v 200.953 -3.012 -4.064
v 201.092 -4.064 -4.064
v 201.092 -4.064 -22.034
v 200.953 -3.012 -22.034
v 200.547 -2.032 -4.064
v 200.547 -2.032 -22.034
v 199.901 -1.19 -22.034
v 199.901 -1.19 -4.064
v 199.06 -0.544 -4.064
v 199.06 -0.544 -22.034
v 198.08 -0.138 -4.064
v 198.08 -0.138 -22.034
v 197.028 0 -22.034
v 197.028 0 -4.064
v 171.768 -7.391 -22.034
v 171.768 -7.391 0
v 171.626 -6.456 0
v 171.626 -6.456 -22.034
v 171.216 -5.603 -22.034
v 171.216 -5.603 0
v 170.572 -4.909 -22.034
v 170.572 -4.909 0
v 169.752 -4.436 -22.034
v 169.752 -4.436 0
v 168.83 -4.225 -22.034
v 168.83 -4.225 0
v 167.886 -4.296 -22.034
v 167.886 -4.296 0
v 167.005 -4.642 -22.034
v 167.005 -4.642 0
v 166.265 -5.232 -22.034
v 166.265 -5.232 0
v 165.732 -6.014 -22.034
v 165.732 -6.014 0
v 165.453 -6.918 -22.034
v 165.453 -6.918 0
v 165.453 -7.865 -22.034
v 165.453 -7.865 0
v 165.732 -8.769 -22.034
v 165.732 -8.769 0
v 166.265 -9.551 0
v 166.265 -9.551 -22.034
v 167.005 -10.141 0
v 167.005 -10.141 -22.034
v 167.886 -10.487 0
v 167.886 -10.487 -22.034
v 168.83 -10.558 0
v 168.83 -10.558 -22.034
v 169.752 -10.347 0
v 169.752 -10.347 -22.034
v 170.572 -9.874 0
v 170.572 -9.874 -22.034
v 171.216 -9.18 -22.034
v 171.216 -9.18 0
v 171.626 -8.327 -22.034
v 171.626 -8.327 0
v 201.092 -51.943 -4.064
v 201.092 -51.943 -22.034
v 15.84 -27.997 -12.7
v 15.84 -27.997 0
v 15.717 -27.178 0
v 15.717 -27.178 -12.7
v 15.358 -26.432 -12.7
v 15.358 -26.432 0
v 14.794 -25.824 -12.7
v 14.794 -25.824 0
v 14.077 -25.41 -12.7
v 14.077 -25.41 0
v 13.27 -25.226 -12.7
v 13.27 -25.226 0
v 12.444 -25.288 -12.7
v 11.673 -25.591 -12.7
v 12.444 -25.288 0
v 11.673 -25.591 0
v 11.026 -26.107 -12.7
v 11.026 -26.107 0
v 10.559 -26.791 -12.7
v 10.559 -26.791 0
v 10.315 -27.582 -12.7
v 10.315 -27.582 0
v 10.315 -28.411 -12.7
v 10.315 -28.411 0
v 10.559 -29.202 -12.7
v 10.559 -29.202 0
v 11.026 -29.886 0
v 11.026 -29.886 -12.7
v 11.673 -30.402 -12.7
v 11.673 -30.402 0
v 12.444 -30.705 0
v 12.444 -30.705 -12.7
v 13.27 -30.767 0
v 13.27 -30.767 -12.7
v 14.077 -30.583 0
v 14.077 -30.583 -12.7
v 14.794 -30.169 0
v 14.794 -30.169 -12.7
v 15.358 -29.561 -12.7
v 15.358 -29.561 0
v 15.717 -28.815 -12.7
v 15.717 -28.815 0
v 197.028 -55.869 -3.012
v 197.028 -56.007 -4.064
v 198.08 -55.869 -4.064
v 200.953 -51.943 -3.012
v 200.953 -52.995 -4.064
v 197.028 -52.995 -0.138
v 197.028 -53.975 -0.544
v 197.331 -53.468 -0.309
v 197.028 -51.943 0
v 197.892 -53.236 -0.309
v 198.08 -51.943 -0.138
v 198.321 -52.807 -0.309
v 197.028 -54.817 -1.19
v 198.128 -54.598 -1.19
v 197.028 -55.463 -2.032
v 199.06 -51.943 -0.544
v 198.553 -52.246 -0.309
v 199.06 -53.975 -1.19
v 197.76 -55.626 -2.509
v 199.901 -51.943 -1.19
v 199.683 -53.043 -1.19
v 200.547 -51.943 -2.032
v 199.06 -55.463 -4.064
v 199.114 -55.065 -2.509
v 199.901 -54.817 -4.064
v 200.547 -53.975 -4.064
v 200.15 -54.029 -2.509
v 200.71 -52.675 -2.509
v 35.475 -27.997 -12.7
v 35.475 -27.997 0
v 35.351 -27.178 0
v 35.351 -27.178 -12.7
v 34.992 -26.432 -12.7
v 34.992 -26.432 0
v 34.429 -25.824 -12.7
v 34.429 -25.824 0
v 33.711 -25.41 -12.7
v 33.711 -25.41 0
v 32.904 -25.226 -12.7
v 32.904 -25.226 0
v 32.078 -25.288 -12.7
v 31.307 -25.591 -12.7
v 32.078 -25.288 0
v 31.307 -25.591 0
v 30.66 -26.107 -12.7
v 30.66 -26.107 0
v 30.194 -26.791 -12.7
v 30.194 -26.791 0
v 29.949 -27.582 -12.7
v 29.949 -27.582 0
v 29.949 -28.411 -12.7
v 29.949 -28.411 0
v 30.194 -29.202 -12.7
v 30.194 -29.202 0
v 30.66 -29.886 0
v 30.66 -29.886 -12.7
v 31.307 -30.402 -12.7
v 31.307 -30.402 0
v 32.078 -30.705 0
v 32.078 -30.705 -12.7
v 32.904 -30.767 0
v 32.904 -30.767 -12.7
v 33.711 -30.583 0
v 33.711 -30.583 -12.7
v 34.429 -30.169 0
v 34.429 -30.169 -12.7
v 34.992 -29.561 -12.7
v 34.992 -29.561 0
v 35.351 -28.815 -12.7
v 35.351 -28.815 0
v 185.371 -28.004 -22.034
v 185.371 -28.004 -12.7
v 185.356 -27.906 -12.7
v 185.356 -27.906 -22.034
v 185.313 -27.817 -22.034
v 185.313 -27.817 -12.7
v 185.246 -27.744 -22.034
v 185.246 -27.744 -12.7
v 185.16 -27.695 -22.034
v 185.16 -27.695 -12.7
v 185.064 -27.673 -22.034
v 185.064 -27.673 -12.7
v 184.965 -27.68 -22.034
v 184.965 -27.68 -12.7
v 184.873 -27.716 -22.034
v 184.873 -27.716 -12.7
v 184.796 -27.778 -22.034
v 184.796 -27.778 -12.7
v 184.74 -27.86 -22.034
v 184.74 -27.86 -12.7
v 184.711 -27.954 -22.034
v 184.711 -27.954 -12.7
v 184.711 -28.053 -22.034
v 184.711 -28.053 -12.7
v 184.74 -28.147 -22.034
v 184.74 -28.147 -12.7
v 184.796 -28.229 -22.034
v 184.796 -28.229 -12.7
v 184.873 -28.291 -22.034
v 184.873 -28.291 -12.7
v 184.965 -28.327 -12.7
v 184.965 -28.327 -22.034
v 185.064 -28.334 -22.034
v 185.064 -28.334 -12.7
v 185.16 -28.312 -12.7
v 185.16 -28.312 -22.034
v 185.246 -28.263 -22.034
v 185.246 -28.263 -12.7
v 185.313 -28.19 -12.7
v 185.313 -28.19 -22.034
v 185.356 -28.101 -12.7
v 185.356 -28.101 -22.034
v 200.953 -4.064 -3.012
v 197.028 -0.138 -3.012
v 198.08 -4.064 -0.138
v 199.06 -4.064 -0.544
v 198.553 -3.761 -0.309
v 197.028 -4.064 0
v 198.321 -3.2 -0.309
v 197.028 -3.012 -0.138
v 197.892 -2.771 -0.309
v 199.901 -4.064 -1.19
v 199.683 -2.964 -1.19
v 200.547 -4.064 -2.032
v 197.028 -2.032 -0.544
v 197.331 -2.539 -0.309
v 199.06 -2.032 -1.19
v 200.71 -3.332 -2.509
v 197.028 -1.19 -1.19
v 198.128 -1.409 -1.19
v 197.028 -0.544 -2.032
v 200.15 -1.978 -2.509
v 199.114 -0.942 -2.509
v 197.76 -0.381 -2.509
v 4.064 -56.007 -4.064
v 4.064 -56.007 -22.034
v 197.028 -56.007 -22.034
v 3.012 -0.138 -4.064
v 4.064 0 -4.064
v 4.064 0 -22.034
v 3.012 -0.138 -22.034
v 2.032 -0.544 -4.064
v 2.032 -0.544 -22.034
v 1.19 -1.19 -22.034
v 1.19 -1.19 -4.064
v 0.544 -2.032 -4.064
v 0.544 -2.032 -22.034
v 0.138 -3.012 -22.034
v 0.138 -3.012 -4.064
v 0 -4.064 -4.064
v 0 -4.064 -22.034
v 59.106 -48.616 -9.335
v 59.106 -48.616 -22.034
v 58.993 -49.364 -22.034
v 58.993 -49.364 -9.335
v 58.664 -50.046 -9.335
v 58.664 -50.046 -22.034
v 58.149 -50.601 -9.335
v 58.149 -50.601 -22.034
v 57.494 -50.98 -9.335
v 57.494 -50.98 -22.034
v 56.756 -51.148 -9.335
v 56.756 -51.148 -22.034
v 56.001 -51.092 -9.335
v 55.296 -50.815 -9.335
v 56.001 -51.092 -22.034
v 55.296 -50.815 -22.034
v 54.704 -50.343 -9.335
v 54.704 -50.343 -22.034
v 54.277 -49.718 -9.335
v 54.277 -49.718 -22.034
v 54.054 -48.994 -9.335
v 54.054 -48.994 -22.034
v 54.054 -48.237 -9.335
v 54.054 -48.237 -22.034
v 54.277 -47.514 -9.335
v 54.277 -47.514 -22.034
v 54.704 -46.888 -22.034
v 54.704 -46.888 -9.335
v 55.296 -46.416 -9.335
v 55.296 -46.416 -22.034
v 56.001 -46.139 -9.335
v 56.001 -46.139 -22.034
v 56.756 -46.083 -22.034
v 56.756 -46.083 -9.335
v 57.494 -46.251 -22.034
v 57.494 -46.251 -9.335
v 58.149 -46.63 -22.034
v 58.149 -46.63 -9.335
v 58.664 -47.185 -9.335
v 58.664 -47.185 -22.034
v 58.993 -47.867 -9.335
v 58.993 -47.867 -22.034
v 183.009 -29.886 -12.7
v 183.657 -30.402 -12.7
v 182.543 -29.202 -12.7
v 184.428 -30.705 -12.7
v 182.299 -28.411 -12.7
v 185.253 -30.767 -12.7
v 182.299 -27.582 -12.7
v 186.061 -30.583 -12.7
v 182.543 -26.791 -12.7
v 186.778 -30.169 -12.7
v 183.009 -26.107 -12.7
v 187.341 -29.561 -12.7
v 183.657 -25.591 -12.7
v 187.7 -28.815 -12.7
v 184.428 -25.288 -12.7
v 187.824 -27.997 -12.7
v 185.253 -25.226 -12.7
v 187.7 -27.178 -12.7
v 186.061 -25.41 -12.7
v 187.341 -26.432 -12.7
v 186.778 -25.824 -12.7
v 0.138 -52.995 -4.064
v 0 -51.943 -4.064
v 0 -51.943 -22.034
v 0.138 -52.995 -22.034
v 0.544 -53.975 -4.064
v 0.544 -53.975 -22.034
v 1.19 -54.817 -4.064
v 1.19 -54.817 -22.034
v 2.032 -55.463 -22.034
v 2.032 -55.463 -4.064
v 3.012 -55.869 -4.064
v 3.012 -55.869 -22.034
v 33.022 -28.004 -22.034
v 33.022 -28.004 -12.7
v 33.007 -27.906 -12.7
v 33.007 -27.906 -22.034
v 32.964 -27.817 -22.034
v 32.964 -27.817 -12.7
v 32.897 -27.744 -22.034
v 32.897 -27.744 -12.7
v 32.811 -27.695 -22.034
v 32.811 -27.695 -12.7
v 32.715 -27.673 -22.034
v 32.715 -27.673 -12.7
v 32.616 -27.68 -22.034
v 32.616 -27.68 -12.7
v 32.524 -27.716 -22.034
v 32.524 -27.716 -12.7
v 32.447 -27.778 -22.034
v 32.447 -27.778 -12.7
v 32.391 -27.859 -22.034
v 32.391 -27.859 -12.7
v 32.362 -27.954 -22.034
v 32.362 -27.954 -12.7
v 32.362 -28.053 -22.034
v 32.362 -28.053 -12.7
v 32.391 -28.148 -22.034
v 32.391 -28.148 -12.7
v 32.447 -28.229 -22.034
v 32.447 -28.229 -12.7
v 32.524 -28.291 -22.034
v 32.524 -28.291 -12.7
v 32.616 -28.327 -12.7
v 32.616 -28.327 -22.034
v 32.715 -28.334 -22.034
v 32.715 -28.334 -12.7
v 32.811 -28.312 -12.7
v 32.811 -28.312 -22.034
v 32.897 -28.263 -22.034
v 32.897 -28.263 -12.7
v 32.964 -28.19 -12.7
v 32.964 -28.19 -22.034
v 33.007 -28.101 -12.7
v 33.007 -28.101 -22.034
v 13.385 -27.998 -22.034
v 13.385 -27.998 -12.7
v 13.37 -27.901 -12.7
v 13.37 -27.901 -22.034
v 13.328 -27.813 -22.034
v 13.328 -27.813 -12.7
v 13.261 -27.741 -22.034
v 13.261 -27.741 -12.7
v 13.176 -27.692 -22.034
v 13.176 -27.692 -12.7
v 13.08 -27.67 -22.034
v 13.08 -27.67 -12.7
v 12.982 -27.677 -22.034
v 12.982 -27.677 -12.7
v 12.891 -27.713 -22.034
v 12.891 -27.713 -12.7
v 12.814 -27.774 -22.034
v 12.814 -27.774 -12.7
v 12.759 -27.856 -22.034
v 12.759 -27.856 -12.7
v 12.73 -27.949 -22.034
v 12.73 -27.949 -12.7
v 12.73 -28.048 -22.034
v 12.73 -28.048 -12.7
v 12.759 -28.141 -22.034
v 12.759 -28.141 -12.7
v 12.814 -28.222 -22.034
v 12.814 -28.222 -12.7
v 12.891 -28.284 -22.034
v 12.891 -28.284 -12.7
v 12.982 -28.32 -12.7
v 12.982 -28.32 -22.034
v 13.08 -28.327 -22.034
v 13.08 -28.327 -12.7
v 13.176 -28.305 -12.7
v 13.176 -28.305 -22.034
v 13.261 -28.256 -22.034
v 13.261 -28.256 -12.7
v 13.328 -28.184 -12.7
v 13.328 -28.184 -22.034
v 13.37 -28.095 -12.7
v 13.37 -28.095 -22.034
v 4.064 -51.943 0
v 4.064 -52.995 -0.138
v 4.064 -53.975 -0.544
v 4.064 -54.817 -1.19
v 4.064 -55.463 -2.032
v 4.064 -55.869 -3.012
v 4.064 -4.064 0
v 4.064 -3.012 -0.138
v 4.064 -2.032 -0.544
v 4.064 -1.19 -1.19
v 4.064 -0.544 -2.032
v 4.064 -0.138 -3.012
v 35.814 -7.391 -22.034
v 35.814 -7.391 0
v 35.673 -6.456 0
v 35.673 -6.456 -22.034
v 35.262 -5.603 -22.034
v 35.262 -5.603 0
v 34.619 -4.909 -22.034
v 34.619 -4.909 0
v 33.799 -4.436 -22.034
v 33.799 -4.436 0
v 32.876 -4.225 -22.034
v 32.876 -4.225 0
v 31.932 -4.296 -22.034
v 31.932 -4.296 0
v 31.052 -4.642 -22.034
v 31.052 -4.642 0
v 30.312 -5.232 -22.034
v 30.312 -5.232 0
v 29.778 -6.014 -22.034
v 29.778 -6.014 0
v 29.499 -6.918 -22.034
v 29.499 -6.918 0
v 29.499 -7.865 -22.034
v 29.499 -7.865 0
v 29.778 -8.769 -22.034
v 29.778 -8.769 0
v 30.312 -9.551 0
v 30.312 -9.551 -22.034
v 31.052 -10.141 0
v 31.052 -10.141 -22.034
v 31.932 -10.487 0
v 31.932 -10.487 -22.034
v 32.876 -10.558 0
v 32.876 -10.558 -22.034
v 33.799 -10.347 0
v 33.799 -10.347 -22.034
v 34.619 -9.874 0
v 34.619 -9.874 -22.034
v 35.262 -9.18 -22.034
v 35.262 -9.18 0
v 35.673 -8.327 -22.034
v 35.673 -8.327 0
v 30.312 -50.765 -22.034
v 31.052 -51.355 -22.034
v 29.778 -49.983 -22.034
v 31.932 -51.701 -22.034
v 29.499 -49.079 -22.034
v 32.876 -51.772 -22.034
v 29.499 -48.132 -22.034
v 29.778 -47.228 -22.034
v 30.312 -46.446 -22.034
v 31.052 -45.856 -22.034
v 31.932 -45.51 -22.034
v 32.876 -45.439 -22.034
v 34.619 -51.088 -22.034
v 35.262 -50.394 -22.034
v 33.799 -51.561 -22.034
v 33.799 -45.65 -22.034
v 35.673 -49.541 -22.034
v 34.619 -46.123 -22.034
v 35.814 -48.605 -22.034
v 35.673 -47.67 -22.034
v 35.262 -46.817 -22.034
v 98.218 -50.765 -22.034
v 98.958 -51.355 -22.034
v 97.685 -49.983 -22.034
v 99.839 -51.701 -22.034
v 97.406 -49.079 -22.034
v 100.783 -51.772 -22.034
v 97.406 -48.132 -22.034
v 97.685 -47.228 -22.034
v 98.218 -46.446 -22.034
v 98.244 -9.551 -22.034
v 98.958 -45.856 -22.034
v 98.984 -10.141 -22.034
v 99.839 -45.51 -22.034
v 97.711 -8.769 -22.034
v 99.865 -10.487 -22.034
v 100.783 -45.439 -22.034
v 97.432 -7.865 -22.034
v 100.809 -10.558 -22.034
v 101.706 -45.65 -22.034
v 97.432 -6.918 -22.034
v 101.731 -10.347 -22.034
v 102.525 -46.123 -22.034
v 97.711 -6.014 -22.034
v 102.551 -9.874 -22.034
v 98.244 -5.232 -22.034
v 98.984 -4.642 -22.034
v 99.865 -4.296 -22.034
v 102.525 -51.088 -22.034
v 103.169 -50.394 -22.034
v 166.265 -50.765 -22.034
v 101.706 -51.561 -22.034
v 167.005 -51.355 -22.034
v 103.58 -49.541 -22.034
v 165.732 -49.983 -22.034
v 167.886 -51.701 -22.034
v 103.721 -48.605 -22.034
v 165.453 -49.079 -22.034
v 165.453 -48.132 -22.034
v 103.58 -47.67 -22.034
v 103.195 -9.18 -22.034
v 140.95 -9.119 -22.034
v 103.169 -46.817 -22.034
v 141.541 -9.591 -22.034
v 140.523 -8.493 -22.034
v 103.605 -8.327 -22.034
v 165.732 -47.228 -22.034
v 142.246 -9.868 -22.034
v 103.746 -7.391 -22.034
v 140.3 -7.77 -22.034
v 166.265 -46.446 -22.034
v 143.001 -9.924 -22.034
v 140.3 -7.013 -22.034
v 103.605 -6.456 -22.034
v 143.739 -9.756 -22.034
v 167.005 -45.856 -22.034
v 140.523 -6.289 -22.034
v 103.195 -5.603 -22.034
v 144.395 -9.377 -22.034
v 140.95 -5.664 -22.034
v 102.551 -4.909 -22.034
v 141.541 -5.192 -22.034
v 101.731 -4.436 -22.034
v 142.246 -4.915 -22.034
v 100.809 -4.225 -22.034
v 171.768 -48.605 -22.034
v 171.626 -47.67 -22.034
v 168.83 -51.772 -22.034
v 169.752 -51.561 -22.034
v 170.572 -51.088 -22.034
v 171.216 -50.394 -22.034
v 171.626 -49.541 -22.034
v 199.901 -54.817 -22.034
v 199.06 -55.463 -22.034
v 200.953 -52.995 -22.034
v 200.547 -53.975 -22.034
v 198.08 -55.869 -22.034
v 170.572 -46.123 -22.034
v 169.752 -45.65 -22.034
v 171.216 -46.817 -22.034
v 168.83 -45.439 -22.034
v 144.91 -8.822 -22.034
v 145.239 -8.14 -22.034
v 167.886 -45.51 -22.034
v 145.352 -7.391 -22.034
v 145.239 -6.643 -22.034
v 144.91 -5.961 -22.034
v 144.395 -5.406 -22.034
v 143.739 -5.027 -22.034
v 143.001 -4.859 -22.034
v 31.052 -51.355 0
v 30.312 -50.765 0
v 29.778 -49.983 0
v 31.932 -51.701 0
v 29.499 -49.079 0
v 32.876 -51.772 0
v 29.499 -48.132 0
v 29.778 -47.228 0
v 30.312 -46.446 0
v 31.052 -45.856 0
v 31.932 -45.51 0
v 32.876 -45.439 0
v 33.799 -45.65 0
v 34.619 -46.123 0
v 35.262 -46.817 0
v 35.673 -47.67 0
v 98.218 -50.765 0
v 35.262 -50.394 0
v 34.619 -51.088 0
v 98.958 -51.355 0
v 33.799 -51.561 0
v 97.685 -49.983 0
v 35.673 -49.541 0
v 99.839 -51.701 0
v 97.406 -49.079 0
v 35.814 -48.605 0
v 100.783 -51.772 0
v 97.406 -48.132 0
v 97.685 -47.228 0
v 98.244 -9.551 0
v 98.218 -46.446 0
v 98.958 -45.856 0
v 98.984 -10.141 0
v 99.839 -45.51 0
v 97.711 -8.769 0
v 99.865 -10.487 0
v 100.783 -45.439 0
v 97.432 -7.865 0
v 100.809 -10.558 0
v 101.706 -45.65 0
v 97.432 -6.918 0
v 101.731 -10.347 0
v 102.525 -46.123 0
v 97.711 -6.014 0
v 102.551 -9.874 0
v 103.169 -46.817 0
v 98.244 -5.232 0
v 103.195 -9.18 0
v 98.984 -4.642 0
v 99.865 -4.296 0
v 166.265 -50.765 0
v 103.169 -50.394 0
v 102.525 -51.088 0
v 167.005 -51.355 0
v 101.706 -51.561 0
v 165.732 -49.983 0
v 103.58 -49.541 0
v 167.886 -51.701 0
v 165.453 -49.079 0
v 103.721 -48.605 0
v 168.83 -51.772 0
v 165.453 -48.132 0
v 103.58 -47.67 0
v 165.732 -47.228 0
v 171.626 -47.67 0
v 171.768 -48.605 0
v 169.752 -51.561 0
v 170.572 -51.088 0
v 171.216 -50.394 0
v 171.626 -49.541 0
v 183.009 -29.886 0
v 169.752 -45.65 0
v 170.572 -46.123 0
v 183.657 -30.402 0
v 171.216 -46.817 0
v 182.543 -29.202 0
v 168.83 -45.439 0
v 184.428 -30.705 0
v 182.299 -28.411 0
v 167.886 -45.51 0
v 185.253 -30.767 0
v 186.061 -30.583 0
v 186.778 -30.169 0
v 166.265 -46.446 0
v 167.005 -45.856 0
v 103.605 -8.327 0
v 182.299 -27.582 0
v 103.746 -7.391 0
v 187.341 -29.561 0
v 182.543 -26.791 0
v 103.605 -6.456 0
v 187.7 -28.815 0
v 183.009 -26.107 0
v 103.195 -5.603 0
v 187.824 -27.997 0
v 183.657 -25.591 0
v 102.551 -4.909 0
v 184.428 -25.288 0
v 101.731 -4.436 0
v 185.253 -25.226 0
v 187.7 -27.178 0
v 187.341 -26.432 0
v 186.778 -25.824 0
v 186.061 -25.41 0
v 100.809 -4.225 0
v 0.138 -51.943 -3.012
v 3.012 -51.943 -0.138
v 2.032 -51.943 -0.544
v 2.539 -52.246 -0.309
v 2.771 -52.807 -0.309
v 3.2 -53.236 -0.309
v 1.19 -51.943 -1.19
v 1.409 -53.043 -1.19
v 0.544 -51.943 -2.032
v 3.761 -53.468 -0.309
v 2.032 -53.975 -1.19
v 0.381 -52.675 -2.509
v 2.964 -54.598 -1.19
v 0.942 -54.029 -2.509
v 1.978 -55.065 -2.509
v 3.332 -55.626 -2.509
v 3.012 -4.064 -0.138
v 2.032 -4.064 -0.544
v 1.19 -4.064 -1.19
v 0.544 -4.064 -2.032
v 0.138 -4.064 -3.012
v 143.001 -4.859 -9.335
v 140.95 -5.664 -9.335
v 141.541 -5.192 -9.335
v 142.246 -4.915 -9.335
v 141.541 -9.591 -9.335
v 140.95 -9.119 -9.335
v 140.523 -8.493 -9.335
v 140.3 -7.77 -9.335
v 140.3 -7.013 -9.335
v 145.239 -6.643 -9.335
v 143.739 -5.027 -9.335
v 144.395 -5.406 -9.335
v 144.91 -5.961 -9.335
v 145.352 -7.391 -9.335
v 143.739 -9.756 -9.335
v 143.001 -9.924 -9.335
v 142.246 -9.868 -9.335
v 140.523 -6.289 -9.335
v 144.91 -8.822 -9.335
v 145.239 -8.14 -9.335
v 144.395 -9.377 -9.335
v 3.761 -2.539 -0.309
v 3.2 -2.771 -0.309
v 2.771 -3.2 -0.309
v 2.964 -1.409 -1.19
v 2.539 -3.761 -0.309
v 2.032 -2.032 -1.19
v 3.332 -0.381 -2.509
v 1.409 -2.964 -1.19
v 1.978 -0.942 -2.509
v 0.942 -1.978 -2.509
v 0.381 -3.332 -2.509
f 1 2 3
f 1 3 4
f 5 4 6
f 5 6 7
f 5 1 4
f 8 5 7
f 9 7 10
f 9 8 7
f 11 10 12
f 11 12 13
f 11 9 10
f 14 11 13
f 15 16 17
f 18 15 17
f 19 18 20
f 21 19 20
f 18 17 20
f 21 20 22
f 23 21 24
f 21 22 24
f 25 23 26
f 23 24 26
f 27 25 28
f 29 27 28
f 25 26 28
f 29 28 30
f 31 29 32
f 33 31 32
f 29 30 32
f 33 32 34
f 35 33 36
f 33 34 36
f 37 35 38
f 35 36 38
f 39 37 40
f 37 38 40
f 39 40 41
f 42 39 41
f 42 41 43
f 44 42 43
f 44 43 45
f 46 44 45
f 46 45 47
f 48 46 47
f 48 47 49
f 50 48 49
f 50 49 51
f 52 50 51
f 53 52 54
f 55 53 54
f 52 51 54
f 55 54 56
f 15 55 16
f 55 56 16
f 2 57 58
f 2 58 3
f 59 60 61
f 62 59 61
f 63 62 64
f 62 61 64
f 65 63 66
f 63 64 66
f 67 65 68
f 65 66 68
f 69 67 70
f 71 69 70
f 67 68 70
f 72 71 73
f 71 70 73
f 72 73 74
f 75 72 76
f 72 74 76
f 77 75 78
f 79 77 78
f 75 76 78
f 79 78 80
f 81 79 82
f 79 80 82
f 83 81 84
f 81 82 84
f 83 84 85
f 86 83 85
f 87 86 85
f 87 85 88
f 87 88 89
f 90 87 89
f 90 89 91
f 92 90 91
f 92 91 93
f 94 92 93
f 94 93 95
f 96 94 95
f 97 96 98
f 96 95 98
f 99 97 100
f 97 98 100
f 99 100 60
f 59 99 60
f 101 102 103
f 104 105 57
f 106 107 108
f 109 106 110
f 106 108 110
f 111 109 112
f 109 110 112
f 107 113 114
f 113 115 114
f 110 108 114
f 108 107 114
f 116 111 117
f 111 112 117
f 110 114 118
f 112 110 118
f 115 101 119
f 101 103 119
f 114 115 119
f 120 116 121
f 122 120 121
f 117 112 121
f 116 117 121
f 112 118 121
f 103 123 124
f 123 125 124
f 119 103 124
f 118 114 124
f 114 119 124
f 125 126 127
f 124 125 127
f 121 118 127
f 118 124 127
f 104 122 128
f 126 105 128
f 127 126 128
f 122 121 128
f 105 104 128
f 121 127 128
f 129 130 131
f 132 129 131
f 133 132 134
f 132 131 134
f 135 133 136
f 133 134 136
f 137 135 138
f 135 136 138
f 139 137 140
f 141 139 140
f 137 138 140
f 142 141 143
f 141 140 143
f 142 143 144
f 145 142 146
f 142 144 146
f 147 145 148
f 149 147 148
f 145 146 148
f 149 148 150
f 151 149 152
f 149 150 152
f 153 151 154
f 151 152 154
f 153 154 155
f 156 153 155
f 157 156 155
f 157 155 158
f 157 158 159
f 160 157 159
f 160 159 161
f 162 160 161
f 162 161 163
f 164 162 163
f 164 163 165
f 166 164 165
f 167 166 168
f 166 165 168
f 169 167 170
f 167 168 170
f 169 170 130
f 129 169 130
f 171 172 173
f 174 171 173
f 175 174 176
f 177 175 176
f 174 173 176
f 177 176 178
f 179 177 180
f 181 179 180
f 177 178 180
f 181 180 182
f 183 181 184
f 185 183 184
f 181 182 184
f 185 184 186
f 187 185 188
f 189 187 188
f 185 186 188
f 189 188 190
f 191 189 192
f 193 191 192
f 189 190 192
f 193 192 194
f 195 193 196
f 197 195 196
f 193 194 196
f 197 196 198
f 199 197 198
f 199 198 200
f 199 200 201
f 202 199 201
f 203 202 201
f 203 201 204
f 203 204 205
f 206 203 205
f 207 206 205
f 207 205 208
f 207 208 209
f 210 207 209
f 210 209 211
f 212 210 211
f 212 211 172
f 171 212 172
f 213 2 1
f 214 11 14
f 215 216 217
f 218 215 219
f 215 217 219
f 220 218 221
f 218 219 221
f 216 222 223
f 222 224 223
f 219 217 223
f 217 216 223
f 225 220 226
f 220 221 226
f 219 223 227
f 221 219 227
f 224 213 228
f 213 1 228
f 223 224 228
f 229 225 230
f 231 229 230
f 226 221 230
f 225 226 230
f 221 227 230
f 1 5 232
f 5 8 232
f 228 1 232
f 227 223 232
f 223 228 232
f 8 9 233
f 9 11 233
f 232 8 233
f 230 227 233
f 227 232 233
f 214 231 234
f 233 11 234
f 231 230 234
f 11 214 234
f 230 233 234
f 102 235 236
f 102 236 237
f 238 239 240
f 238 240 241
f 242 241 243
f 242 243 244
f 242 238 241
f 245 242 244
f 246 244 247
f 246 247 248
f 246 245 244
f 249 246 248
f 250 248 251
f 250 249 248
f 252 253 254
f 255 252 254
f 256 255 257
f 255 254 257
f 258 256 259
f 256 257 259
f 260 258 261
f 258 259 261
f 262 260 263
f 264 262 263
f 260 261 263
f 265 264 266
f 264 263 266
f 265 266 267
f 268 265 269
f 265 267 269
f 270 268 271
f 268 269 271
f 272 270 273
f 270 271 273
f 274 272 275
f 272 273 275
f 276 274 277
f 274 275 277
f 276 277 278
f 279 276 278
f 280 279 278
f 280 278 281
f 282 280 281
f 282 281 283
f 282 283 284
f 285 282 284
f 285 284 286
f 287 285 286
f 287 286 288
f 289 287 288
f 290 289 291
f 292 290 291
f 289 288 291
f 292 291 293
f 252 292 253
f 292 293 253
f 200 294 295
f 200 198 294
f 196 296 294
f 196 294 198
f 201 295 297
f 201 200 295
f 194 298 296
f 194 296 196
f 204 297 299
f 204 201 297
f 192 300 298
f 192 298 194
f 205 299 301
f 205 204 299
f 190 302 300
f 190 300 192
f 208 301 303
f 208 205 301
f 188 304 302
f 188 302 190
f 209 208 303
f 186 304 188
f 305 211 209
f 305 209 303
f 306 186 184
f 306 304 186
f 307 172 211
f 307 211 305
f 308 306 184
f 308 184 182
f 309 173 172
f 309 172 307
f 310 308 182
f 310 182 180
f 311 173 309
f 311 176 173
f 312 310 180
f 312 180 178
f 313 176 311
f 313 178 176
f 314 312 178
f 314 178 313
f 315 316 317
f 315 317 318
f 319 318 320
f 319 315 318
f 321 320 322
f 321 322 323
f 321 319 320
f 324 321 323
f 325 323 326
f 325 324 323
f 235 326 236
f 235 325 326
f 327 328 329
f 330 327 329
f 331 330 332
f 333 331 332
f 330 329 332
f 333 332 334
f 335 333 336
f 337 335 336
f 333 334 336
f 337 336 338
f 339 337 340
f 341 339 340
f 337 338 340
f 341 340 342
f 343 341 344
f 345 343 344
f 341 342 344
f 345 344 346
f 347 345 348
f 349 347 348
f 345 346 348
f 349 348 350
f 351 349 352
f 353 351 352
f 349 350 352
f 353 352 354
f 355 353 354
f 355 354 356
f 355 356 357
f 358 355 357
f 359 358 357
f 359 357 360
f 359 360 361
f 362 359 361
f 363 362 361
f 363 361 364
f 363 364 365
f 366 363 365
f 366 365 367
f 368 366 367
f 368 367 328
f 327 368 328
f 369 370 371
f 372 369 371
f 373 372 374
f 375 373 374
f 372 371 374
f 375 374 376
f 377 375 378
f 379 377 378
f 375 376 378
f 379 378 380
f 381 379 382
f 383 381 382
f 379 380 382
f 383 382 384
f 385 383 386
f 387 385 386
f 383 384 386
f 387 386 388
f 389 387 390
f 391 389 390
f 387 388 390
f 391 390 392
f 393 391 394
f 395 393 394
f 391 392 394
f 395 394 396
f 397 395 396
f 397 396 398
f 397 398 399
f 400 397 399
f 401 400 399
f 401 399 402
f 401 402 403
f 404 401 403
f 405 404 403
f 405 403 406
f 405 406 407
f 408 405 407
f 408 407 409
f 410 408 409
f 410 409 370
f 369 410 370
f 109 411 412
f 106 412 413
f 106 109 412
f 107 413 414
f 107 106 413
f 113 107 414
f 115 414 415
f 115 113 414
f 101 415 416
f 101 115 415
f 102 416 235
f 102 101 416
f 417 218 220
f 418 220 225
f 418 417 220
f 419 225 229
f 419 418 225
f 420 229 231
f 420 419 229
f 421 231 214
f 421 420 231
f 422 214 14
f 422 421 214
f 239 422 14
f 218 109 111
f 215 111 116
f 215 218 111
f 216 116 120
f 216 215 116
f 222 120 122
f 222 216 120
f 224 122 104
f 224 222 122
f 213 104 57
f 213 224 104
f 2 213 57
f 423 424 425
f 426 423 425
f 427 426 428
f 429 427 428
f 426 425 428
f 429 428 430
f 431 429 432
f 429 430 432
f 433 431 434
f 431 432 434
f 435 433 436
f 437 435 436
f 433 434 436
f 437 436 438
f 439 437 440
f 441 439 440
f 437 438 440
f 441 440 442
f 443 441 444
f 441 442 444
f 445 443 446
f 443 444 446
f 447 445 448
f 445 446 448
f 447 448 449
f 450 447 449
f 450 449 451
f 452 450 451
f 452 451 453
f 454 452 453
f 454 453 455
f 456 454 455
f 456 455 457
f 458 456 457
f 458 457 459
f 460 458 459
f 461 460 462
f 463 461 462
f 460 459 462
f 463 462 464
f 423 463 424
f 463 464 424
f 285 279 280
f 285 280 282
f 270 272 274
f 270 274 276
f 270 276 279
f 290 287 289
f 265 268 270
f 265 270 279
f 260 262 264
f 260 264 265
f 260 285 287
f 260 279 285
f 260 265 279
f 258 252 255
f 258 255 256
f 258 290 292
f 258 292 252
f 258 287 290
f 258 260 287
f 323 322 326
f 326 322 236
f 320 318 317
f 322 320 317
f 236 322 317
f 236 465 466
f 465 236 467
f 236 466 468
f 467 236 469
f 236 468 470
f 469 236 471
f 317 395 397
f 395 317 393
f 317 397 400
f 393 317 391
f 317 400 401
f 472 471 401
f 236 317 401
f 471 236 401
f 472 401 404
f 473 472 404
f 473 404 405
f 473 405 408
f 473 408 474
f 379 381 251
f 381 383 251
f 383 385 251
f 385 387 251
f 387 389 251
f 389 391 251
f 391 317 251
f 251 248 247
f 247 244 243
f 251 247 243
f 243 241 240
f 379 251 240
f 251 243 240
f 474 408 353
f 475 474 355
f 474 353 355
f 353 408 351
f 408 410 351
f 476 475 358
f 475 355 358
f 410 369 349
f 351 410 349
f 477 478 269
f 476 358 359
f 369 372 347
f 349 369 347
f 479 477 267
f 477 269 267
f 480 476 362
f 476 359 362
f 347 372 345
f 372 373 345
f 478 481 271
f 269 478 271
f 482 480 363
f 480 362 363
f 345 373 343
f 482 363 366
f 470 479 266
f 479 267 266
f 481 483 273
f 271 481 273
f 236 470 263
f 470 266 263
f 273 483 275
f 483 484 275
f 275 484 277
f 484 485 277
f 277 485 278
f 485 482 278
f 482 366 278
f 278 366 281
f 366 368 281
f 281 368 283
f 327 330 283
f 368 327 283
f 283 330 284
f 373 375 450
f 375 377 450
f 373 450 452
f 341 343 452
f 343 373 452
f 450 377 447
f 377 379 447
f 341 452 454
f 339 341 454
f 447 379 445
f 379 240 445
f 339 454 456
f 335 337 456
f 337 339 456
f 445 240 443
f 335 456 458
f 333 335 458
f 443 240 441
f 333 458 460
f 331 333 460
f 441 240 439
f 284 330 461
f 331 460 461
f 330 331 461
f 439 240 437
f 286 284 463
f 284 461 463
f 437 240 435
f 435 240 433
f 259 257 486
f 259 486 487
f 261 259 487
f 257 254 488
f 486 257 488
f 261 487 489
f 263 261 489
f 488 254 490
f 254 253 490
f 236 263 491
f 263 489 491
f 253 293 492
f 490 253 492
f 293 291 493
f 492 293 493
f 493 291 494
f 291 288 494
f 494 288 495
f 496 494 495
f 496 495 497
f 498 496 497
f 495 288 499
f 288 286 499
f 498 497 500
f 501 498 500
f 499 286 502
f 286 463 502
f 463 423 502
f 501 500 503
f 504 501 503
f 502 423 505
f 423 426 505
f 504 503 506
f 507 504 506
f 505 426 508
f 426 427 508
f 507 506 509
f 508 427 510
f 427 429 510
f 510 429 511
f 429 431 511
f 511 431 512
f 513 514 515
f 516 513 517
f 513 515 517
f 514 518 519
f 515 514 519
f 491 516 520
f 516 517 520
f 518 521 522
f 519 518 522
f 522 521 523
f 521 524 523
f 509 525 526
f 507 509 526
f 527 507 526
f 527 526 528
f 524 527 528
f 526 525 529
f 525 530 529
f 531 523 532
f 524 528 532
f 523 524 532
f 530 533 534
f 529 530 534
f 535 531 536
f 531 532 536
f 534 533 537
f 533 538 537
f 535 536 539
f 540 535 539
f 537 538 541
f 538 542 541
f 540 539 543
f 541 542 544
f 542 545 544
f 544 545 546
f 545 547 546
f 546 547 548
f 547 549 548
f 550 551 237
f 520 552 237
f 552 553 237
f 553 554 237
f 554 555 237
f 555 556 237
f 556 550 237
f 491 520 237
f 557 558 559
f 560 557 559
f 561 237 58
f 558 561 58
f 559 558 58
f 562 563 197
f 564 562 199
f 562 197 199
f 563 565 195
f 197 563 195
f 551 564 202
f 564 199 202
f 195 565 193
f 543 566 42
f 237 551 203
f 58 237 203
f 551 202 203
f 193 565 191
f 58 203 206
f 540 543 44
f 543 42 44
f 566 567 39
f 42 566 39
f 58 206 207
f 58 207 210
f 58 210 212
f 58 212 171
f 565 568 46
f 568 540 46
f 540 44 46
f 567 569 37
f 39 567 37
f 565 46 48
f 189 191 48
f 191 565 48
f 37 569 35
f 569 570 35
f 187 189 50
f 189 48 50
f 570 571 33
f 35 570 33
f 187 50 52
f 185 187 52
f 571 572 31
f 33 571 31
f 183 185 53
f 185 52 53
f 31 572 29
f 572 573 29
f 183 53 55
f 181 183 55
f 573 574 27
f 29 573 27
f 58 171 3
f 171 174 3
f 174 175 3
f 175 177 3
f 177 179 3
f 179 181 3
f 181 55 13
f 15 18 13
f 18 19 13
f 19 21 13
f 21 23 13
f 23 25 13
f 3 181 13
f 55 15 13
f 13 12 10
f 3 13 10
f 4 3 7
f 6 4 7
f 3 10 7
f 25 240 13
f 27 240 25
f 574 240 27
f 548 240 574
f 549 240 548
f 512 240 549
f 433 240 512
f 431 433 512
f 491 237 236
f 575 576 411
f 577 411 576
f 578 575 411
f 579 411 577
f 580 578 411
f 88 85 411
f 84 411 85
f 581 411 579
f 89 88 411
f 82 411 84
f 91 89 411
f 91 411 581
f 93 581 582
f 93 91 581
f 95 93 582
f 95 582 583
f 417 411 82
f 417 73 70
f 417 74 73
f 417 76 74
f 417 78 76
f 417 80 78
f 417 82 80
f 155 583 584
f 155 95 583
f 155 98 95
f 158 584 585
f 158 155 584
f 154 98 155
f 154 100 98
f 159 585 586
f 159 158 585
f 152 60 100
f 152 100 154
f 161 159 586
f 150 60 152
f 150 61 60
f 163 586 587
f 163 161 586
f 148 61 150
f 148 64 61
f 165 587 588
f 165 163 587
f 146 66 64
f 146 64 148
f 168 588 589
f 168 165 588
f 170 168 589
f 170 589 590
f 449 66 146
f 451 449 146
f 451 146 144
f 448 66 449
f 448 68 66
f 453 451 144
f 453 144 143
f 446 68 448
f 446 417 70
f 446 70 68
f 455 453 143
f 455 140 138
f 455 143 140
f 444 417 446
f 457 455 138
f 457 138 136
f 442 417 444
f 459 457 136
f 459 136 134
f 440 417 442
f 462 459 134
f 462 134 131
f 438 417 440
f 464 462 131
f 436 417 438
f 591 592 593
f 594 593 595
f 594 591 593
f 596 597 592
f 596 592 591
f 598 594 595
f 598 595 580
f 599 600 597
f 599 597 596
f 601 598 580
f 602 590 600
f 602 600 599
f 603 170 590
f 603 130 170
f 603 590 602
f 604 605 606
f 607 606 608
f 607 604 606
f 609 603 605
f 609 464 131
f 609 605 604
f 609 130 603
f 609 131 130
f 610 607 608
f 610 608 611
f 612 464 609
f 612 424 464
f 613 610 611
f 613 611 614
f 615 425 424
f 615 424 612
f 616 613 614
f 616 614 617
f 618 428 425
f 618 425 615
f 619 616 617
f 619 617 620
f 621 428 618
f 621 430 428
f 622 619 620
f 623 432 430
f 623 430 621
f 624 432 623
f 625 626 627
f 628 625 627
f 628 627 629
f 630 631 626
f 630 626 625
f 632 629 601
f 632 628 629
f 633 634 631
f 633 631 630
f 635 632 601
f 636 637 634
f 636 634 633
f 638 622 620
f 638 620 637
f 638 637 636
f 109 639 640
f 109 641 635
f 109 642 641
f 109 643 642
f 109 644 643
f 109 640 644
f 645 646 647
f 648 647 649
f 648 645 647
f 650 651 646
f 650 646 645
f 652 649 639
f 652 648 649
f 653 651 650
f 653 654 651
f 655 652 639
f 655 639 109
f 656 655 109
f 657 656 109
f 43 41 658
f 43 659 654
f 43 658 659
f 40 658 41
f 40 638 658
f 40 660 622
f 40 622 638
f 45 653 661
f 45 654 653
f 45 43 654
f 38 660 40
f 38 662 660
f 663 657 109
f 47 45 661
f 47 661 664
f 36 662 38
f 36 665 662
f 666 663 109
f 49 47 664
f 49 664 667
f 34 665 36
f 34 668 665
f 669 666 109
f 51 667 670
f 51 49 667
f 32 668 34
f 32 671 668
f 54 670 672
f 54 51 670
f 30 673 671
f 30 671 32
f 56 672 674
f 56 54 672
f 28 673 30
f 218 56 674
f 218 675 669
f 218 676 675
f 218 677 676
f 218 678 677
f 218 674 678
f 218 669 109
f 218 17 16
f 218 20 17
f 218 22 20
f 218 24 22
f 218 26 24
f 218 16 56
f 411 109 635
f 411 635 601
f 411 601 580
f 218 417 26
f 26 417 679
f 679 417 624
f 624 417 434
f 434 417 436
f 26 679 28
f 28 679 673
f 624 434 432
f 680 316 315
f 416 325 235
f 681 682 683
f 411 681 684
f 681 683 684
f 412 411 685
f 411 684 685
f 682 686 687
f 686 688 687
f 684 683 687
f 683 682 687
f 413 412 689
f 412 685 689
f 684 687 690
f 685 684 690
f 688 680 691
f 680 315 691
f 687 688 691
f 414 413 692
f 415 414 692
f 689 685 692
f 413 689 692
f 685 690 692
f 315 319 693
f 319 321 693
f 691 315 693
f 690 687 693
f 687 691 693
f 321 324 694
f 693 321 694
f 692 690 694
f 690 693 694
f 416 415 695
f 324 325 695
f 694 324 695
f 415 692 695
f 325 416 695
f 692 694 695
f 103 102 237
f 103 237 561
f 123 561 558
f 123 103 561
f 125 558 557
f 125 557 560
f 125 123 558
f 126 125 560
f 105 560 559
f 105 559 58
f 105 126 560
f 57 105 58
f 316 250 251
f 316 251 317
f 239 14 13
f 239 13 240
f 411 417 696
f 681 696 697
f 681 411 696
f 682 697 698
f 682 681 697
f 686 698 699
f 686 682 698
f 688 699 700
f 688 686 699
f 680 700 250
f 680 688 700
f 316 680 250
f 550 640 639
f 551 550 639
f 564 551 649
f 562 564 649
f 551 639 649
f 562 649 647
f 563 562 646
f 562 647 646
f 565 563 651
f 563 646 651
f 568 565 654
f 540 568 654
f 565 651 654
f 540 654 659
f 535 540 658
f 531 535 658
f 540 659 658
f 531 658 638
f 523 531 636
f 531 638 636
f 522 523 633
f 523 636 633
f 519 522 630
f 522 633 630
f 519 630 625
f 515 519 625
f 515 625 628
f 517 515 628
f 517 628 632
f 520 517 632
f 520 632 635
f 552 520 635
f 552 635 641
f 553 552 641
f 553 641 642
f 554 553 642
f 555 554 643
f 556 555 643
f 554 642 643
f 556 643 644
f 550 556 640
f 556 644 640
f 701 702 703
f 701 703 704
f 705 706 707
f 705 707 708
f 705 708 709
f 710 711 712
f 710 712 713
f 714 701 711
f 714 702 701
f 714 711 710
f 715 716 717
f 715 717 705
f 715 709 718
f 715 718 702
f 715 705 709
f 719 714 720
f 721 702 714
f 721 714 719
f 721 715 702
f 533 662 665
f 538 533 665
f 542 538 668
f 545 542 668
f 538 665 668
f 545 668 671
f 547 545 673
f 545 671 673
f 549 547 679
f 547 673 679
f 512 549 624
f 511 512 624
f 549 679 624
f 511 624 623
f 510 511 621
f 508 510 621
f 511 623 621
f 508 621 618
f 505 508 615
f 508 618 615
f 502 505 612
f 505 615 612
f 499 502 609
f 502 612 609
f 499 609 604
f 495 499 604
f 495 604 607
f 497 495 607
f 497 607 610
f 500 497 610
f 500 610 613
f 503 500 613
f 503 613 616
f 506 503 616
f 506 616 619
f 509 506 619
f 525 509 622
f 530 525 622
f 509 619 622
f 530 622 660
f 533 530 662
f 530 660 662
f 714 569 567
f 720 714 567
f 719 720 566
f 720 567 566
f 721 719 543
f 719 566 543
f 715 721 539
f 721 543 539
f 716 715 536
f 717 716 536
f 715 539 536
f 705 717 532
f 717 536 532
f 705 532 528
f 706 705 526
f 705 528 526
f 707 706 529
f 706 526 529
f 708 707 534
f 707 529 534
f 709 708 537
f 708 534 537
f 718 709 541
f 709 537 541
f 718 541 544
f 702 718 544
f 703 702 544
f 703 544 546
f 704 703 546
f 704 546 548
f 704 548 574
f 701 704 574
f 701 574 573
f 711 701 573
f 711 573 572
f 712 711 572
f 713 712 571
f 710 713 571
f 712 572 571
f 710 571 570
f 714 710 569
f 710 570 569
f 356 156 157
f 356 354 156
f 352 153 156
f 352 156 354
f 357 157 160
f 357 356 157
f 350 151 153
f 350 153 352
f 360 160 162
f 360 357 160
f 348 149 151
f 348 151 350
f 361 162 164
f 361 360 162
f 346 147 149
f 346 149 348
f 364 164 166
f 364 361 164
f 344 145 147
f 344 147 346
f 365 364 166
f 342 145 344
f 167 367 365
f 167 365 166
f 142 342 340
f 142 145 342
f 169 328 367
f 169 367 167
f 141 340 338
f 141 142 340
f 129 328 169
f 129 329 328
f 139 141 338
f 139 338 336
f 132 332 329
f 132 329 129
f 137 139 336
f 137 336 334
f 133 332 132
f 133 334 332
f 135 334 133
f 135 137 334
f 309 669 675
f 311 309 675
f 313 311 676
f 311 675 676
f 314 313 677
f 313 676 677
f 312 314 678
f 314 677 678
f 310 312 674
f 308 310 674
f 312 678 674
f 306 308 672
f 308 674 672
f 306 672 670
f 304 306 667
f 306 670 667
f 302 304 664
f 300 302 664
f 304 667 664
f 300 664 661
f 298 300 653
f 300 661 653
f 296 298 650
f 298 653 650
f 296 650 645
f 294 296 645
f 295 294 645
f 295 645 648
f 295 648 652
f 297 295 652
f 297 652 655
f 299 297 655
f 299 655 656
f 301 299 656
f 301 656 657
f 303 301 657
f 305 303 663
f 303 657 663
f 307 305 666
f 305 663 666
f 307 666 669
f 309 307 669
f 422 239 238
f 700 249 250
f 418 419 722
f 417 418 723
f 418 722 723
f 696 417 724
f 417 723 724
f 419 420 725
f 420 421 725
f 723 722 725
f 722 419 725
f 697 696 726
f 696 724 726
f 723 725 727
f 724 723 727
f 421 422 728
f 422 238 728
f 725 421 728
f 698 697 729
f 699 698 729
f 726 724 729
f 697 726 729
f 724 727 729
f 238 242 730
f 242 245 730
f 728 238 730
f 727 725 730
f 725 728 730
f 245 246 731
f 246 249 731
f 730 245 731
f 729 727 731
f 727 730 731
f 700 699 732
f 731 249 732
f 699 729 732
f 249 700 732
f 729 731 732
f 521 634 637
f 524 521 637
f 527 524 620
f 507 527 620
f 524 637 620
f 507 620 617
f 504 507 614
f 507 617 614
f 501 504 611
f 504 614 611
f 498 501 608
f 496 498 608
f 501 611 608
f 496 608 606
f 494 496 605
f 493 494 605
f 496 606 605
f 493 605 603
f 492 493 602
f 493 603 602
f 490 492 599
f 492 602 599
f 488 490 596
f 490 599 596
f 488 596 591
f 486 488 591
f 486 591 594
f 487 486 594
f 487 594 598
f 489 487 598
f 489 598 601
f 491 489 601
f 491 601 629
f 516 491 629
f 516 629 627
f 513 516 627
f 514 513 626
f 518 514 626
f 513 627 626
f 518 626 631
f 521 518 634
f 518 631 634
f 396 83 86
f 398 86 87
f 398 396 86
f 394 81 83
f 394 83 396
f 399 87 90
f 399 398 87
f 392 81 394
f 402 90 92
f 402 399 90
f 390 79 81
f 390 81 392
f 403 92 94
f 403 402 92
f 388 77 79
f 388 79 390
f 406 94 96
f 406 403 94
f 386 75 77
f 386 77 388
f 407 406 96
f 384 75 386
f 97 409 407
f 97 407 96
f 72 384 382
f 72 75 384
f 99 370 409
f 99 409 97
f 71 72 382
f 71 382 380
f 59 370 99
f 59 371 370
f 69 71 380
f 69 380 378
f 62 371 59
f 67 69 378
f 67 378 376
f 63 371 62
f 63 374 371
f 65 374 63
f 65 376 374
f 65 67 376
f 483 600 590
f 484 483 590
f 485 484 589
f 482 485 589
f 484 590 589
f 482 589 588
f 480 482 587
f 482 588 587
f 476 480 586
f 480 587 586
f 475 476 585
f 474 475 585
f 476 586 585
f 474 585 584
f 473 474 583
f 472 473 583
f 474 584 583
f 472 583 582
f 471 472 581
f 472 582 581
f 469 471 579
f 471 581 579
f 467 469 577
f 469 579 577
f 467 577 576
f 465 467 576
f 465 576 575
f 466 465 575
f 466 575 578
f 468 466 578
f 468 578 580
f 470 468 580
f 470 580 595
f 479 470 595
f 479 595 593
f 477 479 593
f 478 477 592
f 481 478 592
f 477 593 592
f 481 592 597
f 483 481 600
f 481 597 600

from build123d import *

# Parameters (mm, degrees)
F0_R     = 3.175
F1_DEPTH = 22.0345
F2_R     = 2.54
F3_DEPTH = 12.7
F4_R     = 0.3318916447
F4_R_2   = 0.3293568933
F4_R_3   = 0.3316016918
F5_DEPTH = 25.4
F6_R     = 2.778125
F7_DEPTH = 12.7
F9_R     = 4.064


with BuildPart() as f1:
    # F0 (on Top) → F1 (new body)
    with BuildSketch(Plane.XY):
        with BuildLine():
            Line((197.0278, 0), (4.064, 0))
            ThreePointArc((4.064, 0), (1.1903180413, -1.1903180413), (0, -4.064))
            Line((0, -4.064), (0, -51.943))
            ThreePointArc((0, -51.943), (1.1903180413, -54.8166819587), (4.064, -56.007))
            Line((4.064, -56.007), (197.0278, -56.007))
            ThreePointArc((197.0278, -56.007), (199.9014819587, -54.8166819587), (201.0918, -51.943))
            Line((201.0918, -51.943), (201.0918, -4.064))
            ThreePointArc((201.0918, -4.064), (199.9014819587, -1.1903180413), (197.0278, 0))
        make_face()
        with Locations((32.639, -48.60544)):
            Circle(F0_R, mode=Mode.SUBTRACT)
        with Locations((100.5459, -48.60544)):
            Circle(F0_R, mode=Mode.SUBTRACT)
        with Locations((168.5925, -48.60544)):
            Circle(F0_R, mode=Mode.SUBTRACT)
        with Locations((32.639, -7.3914)):
            Circle(F0_R, mode=Mode.SUBTRACT)
        with Locations((100.5713, -7.3914)):
            Circle(F0_R, mode=Mode.SUBTRACT)
        with Locations((168.5925, -7.3914)):
            Circle(F0_R, mode=Mode.SUBTRACT)
    extrude(amount=-F1_DEPTH)

    # F2 (on face) → F3 (cut)
    with BuildSketch(Plane(origin=(0, 0, -22.0345), x_dir=(1, 0, 0), z_dir=(0, 0, -1))):
        with Locations((56.5658, 48.6156)):
            Circle(F2_R)
        with Locations((142.8115, 7.3914)):
            Circle(F2_R)
    extrude(amount=-F3_DEPTH, mode=Mode.SUBTRACT)

    # F4 (on face) → F5 (cut)
    with BuildSketch(Plane.XY):
        with Locations((32.6898, -28.0035)):
            Circle(F4_R)
        with Locations((13.0556, -27.99842)):
            Circle(F4_R_2)
        with Locations((185.039, -28.0035)):
            Circle(F4_R_3)
    extrude(amount=-F5_DEPTH, mode=Mode.SUBTRACT)

    # F6 (on Top) → F7 (cut)
    with BuildSketch(Plane.XY):
        with Locations((185.0457321729, -27.9965074454)):
            Circle(F6_R)
        with Locations((32.6965321729, -27.9965074454)):
            Circle(F6_R)
        with Locations((13.0623321729, -27.9965074454)):
            Circle(F6_R)
    extrude(amount=-F7_DEPTH, mode=Mode.SUBTRACT)

    # F9
    f9_edges = [f1.edges().sort_by_distance(p)[0] for p in [
        (100.5459, -56.007, 0),
        (199.901482, -54.816682, 0),
        (201.0918, -28.0035, 0),
        (199.901482, -1.190318, 0),
        (100.5459, 0, 0),
        (1.190318, -1.190318, 0),
        (0, -28.0035, 0),
        (1.190318, -54.816682, 0),
    ]]
    fillet(f9_edges, radius=F9_R)


solid = f1.part
